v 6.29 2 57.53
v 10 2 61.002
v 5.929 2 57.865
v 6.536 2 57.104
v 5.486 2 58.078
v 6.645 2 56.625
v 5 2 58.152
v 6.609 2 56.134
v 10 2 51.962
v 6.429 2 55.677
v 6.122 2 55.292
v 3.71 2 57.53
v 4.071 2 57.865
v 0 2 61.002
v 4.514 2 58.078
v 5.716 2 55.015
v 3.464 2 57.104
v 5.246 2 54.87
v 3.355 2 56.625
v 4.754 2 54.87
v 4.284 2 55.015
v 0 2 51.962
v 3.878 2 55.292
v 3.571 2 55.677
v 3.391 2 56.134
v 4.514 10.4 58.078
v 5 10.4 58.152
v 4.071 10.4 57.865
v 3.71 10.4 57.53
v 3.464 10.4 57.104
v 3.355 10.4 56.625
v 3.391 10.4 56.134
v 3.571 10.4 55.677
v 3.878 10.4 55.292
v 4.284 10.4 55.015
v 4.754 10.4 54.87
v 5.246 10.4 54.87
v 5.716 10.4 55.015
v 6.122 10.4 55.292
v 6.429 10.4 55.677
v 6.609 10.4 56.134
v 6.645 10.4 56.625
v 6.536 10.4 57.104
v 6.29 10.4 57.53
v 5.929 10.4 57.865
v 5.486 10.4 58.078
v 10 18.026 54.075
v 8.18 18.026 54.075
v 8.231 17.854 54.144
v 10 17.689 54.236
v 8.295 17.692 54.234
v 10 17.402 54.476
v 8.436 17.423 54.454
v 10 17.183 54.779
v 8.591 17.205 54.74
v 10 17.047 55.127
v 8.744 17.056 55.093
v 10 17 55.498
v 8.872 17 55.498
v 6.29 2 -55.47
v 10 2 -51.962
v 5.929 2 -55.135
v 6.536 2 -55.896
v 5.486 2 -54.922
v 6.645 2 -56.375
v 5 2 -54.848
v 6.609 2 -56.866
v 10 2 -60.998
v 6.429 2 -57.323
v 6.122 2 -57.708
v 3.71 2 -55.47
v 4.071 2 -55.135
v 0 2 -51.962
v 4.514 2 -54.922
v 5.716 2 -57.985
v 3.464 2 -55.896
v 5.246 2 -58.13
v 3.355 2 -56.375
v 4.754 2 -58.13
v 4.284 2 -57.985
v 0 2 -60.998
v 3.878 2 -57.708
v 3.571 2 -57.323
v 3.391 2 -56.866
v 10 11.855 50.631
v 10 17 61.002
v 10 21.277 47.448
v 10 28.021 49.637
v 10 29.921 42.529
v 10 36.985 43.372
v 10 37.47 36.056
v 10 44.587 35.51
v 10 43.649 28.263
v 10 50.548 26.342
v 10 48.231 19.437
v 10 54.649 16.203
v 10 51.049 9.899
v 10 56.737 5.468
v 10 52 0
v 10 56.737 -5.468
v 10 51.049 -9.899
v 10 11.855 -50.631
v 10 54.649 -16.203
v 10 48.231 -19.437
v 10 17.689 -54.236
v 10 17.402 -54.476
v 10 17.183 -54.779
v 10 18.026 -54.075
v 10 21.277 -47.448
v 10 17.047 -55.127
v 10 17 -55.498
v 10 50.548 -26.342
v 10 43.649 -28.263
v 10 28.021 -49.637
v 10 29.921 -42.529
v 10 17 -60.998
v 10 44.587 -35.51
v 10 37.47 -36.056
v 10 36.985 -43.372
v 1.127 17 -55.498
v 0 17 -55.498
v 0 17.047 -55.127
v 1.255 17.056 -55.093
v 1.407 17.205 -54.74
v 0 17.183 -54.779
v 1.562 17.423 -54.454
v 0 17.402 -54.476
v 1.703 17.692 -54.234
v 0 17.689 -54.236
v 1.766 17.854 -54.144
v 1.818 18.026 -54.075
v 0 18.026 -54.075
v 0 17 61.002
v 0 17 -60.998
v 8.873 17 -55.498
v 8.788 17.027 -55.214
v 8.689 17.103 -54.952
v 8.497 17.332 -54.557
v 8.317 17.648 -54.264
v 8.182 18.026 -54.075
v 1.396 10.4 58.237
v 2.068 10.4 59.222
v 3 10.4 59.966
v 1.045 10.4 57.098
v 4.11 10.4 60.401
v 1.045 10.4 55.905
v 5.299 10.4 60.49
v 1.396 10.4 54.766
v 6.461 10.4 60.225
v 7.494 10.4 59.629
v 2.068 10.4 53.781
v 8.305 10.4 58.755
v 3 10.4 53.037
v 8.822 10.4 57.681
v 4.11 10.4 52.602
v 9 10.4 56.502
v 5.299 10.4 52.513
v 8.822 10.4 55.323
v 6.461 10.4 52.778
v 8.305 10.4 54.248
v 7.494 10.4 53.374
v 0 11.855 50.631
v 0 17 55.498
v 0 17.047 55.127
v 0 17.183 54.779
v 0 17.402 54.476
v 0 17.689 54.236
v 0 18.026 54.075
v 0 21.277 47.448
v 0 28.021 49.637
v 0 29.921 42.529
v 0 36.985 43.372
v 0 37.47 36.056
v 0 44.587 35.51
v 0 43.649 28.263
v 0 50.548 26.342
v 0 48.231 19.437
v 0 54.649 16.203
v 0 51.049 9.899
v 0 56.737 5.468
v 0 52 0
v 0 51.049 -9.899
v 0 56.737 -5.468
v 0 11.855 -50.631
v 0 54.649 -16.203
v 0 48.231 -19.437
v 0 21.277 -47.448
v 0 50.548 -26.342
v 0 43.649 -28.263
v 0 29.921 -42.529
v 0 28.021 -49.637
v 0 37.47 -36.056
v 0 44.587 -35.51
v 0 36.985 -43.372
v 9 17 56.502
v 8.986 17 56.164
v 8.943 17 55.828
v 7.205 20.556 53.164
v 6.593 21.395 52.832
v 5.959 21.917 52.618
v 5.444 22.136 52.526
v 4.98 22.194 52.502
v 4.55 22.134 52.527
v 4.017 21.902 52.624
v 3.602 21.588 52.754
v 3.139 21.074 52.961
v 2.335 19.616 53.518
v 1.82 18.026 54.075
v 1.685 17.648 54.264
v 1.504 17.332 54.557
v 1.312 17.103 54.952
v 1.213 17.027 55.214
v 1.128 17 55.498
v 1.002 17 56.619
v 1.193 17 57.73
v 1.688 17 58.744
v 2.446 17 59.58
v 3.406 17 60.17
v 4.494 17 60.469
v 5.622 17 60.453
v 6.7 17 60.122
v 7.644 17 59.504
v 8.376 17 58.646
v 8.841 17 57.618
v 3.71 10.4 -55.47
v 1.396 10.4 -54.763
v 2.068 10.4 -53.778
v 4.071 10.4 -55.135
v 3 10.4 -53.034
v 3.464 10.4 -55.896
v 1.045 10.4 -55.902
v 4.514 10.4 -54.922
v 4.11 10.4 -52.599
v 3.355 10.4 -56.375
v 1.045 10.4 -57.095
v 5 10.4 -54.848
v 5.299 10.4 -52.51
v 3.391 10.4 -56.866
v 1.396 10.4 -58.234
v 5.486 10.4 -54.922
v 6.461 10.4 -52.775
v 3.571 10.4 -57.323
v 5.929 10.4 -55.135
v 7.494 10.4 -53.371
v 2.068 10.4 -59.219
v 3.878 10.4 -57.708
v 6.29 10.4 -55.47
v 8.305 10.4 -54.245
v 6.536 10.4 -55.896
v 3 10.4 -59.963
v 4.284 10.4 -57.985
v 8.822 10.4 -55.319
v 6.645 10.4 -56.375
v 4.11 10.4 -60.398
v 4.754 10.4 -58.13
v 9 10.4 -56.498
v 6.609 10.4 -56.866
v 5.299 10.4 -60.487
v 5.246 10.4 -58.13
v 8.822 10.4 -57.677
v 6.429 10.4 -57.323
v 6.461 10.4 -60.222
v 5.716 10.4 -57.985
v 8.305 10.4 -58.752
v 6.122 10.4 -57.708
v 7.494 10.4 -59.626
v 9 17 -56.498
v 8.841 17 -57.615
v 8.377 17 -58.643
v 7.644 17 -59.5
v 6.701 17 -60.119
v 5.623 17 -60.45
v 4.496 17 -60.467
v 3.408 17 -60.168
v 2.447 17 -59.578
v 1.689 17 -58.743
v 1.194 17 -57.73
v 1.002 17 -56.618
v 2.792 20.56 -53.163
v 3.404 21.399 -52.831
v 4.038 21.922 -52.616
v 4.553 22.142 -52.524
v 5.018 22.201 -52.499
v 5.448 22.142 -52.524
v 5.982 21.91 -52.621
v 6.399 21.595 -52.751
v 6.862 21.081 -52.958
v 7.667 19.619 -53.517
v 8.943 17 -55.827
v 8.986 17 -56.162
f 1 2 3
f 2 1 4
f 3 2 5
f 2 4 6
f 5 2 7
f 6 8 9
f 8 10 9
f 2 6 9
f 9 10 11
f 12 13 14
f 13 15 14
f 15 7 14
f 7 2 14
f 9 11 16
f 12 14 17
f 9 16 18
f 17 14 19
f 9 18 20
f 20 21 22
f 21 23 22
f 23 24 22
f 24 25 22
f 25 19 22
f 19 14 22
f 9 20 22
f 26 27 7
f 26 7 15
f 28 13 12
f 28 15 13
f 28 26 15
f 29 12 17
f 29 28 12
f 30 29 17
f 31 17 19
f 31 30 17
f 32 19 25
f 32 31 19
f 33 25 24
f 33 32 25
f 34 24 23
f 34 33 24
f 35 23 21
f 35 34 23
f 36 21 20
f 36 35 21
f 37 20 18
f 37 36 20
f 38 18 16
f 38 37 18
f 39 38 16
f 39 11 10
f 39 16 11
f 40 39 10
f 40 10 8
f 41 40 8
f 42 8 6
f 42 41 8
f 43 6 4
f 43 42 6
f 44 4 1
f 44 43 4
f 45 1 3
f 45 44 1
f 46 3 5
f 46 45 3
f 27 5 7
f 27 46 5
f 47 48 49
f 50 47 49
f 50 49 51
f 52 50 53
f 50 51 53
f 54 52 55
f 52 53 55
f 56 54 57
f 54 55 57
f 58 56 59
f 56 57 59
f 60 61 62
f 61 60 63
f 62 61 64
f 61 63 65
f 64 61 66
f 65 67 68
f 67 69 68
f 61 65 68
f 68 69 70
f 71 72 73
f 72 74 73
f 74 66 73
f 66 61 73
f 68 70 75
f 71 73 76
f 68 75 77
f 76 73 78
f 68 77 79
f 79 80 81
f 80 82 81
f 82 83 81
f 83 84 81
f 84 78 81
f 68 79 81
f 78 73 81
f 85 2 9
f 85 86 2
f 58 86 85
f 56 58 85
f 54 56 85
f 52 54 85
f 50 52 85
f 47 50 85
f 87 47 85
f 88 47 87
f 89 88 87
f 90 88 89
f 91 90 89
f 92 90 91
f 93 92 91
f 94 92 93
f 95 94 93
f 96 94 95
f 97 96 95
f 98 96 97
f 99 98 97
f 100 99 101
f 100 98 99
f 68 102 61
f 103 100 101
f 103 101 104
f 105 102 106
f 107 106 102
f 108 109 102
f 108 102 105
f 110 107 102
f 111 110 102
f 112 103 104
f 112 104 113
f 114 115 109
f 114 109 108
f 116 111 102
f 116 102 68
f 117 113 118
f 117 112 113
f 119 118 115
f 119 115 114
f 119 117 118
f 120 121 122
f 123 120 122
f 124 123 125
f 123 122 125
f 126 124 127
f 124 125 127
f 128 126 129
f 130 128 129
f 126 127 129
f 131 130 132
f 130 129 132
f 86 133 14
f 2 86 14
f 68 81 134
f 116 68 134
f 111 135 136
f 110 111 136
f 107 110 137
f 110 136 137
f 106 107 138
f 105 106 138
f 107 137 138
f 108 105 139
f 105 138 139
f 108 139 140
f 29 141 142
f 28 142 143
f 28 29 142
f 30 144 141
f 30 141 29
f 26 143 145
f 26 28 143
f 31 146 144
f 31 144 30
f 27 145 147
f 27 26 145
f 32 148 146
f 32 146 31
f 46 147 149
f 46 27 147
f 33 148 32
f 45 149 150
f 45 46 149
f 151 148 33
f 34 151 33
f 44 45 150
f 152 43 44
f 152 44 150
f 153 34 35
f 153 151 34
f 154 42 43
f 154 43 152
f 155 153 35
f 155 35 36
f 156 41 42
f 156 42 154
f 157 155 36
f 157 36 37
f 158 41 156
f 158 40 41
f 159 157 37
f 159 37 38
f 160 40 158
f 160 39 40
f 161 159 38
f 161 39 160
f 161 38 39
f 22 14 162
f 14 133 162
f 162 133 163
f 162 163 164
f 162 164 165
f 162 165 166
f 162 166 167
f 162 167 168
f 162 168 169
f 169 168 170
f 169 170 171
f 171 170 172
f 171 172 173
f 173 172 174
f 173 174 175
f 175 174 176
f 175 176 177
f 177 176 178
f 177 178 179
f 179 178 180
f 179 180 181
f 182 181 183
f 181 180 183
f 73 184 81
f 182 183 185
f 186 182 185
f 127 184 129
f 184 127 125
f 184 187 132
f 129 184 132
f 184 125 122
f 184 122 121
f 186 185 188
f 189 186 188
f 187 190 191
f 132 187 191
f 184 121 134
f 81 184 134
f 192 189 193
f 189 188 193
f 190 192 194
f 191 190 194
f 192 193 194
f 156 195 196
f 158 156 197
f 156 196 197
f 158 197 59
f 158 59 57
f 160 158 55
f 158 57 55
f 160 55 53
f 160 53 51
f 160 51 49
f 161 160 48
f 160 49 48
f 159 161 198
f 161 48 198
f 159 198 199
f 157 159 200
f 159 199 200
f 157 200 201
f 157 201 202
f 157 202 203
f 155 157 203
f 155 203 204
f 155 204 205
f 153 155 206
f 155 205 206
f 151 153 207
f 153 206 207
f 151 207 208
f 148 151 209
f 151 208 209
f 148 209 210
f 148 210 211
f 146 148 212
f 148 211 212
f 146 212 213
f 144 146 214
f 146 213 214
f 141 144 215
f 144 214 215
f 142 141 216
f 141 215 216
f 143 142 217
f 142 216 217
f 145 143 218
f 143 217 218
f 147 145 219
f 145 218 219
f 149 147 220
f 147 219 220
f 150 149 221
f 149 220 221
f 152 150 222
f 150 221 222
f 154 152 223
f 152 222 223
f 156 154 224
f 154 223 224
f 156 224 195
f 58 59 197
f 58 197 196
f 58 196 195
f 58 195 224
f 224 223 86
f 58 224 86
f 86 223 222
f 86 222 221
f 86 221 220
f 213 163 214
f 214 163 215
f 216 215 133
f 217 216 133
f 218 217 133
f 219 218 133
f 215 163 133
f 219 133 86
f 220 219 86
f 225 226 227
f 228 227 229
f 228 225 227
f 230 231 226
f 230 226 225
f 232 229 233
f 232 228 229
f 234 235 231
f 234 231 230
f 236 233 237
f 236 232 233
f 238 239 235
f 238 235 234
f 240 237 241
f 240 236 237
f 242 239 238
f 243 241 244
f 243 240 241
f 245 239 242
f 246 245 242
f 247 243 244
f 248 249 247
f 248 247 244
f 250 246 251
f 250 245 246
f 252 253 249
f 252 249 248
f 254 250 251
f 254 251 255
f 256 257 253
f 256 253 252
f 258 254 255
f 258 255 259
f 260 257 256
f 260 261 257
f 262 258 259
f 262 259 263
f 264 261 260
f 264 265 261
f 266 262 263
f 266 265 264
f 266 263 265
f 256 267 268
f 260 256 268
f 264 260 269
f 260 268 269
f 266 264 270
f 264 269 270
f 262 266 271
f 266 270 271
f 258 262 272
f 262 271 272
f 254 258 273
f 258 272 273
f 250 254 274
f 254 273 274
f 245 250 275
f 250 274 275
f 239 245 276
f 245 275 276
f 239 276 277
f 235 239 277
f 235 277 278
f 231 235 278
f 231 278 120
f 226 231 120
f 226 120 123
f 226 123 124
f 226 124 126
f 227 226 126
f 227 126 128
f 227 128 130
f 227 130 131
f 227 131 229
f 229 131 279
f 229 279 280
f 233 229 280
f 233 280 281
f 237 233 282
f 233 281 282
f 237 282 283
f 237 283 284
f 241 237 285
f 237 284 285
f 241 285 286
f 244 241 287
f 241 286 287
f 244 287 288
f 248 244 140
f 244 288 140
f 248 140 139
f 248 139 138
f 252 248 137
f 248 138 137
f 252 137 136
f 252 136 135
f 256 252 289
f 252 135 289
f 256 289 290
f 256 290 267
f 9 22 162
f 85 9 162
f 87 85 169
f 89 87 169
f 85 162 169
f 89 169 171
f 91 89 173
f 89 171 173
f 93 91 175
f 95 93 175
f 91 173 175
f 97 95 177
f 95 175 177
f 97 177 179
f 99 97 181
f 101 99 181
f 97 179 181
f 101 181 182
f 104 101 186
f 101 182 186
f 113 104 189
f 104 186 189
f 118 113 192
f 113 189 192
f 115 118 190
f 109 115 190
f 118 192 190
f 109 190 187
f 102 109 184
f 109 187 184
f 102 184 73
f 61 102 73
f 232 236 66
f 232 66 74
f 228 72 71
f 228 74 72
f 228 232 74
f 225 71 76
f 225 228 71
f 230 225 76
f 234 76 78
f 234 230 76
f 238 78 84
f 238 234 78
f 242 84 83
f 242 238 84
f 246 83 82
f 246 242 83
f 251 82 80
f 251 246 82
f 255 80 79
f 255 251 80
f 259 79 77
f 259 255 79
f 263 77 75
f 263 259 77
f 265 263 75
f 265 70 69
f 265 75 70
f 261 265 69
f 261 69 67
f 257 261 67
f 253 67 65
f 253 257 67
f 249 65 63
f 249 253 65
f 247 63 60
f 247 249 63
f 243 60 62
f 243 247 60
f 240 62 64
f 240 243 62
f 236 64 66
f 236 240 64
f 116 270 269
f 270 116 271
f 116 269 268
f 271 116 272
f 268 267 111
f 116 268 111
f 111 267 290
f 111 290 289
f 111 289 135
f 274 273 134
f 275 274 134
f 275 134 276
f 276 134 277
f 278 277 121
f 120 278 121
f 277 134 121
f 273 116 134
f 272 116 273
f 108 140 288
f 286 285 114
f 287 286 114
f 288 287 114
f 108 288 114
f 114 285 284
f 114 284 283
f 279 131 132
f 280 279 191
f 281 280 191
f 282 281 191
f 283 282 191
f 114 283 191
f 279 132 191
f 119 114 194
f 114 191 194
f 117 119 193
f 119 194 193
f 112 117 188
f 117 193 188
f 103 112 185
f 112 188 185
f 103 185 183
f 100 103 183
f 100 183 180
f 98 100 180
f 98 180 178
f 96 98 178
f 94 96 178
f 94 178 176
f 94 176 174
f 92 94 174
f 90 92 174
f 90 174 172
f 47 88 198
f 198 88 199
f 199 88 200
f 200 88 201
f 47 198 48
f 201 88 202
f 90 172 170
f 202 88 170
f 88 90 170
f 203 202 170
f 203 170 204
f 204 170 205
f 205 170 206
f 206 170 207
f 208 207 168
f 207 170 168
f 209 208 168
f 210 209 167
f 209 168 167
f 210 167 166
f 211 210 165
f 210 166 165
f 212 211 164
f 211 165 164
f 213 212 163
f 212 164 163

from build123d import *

# Parameters (mm, degrees)
BOSS_EXTRUDE1_DEPTH        = 10
M4_TAPPED_HOLE1_AT_2_COUNT = 2
M4_TAPPED_HOLE1_AT_2_PITCH = 113
SKETCH7_R                  = 4
CUT_EXTRUDE1_DEPTH         = 10
CUT_EXTRUDE1_DEPTH_BACK    = 6.6


with BuildPart() as part:
    # Sketch1 → Boss-Extrude1 (new body)
    with BuildSketch(Plane(origin=(0, 0, 0), x_dir=(0, 0, -1), z_dir=(1, 0, 0))):
        with BuildLine():
            Line((-61.001524227, 2), (-51.961524227, 2))
            ThreePointArc((-51.961524227, 2), (0, 52), (51.961524227, 2))
            Line((51.961524227, 2), (60.998475773, 2))
            Line((60.998475773, 2), (60.998475773, 17))
            Line((60.998475773, 17), (55.497747702, 17))
            ThreePointArc((55.497747702, 17), (54.620689683, 17.283131383), (54.07472853, 18.025641026))
            ThreePointArc((54.07472853, 18.025641026), (0, 57), (-54.07472853, 18.025641026))
            ThreePointArc((-54.07472853, 18.025641026), (-54.620689683, 17.283131383), (-55.497747702, 17))
            Line((-55.497747702, 17), (-61.001524227, 17))
            Line((-61.001524227, 17), (-61.001524227, 2))
        make_face()
    extrude(amount=BOSS_EXTRUDE1_DEPTH)

    # Sketch4 → M4 Tapped Hole1 (revolve, cut)
    with BuildSketch(Plane(origin=(5, 17, -56.498475773), x_dir=(0, 0, 1), z_dir=(1, 0, 0))):
        Polygon((0, 0), (0, 21.091420021), (1.65, 20.1), (1.65, 0), align=None)
    m4_tapped_hole1 = revolve(axis=Axis((5, 23.35, -56.498475773), (0, -1, 0)), mode=Mode.SUBTRACT)

    # M4 Tapped Hole1 at 2: M4 Tapped Hole1 ×2
    with Locations(*[(0, 0, i * M4_TAPPED_HOLE1_AT_2_PITCH) for i in range(1, M4_TAPPED_HOLE1_AT_2_COUNT)]):
        add(m4_tapped_hole1, mode=Mode.SUBTRACT)

    # Sketch7 → Cut-Extrude1 (cut, two sides)
    with BuildSketch(Plane(origin=(0, 17, 0), x_dir=(1, 0, 0), z_dir=(0, 1, 0))) as cut_extrude1_sk:
        with Locations((5, 56.498475773)):
            Circle(SKETCH7_R)
        with Locations((5, -56.501524227)):
            Circle(SKETCH7_R)
    extrude(amount=CUT_EXTRUDE1_DEPTH, mode=Mode.SUBTRACT)
    extrude(cut_extrude1_sk.sketch, amount=-CUT_EXTRUDE1_DEPTH_BACK, mode=Mode.SUBTRACT)


solid = part.part
